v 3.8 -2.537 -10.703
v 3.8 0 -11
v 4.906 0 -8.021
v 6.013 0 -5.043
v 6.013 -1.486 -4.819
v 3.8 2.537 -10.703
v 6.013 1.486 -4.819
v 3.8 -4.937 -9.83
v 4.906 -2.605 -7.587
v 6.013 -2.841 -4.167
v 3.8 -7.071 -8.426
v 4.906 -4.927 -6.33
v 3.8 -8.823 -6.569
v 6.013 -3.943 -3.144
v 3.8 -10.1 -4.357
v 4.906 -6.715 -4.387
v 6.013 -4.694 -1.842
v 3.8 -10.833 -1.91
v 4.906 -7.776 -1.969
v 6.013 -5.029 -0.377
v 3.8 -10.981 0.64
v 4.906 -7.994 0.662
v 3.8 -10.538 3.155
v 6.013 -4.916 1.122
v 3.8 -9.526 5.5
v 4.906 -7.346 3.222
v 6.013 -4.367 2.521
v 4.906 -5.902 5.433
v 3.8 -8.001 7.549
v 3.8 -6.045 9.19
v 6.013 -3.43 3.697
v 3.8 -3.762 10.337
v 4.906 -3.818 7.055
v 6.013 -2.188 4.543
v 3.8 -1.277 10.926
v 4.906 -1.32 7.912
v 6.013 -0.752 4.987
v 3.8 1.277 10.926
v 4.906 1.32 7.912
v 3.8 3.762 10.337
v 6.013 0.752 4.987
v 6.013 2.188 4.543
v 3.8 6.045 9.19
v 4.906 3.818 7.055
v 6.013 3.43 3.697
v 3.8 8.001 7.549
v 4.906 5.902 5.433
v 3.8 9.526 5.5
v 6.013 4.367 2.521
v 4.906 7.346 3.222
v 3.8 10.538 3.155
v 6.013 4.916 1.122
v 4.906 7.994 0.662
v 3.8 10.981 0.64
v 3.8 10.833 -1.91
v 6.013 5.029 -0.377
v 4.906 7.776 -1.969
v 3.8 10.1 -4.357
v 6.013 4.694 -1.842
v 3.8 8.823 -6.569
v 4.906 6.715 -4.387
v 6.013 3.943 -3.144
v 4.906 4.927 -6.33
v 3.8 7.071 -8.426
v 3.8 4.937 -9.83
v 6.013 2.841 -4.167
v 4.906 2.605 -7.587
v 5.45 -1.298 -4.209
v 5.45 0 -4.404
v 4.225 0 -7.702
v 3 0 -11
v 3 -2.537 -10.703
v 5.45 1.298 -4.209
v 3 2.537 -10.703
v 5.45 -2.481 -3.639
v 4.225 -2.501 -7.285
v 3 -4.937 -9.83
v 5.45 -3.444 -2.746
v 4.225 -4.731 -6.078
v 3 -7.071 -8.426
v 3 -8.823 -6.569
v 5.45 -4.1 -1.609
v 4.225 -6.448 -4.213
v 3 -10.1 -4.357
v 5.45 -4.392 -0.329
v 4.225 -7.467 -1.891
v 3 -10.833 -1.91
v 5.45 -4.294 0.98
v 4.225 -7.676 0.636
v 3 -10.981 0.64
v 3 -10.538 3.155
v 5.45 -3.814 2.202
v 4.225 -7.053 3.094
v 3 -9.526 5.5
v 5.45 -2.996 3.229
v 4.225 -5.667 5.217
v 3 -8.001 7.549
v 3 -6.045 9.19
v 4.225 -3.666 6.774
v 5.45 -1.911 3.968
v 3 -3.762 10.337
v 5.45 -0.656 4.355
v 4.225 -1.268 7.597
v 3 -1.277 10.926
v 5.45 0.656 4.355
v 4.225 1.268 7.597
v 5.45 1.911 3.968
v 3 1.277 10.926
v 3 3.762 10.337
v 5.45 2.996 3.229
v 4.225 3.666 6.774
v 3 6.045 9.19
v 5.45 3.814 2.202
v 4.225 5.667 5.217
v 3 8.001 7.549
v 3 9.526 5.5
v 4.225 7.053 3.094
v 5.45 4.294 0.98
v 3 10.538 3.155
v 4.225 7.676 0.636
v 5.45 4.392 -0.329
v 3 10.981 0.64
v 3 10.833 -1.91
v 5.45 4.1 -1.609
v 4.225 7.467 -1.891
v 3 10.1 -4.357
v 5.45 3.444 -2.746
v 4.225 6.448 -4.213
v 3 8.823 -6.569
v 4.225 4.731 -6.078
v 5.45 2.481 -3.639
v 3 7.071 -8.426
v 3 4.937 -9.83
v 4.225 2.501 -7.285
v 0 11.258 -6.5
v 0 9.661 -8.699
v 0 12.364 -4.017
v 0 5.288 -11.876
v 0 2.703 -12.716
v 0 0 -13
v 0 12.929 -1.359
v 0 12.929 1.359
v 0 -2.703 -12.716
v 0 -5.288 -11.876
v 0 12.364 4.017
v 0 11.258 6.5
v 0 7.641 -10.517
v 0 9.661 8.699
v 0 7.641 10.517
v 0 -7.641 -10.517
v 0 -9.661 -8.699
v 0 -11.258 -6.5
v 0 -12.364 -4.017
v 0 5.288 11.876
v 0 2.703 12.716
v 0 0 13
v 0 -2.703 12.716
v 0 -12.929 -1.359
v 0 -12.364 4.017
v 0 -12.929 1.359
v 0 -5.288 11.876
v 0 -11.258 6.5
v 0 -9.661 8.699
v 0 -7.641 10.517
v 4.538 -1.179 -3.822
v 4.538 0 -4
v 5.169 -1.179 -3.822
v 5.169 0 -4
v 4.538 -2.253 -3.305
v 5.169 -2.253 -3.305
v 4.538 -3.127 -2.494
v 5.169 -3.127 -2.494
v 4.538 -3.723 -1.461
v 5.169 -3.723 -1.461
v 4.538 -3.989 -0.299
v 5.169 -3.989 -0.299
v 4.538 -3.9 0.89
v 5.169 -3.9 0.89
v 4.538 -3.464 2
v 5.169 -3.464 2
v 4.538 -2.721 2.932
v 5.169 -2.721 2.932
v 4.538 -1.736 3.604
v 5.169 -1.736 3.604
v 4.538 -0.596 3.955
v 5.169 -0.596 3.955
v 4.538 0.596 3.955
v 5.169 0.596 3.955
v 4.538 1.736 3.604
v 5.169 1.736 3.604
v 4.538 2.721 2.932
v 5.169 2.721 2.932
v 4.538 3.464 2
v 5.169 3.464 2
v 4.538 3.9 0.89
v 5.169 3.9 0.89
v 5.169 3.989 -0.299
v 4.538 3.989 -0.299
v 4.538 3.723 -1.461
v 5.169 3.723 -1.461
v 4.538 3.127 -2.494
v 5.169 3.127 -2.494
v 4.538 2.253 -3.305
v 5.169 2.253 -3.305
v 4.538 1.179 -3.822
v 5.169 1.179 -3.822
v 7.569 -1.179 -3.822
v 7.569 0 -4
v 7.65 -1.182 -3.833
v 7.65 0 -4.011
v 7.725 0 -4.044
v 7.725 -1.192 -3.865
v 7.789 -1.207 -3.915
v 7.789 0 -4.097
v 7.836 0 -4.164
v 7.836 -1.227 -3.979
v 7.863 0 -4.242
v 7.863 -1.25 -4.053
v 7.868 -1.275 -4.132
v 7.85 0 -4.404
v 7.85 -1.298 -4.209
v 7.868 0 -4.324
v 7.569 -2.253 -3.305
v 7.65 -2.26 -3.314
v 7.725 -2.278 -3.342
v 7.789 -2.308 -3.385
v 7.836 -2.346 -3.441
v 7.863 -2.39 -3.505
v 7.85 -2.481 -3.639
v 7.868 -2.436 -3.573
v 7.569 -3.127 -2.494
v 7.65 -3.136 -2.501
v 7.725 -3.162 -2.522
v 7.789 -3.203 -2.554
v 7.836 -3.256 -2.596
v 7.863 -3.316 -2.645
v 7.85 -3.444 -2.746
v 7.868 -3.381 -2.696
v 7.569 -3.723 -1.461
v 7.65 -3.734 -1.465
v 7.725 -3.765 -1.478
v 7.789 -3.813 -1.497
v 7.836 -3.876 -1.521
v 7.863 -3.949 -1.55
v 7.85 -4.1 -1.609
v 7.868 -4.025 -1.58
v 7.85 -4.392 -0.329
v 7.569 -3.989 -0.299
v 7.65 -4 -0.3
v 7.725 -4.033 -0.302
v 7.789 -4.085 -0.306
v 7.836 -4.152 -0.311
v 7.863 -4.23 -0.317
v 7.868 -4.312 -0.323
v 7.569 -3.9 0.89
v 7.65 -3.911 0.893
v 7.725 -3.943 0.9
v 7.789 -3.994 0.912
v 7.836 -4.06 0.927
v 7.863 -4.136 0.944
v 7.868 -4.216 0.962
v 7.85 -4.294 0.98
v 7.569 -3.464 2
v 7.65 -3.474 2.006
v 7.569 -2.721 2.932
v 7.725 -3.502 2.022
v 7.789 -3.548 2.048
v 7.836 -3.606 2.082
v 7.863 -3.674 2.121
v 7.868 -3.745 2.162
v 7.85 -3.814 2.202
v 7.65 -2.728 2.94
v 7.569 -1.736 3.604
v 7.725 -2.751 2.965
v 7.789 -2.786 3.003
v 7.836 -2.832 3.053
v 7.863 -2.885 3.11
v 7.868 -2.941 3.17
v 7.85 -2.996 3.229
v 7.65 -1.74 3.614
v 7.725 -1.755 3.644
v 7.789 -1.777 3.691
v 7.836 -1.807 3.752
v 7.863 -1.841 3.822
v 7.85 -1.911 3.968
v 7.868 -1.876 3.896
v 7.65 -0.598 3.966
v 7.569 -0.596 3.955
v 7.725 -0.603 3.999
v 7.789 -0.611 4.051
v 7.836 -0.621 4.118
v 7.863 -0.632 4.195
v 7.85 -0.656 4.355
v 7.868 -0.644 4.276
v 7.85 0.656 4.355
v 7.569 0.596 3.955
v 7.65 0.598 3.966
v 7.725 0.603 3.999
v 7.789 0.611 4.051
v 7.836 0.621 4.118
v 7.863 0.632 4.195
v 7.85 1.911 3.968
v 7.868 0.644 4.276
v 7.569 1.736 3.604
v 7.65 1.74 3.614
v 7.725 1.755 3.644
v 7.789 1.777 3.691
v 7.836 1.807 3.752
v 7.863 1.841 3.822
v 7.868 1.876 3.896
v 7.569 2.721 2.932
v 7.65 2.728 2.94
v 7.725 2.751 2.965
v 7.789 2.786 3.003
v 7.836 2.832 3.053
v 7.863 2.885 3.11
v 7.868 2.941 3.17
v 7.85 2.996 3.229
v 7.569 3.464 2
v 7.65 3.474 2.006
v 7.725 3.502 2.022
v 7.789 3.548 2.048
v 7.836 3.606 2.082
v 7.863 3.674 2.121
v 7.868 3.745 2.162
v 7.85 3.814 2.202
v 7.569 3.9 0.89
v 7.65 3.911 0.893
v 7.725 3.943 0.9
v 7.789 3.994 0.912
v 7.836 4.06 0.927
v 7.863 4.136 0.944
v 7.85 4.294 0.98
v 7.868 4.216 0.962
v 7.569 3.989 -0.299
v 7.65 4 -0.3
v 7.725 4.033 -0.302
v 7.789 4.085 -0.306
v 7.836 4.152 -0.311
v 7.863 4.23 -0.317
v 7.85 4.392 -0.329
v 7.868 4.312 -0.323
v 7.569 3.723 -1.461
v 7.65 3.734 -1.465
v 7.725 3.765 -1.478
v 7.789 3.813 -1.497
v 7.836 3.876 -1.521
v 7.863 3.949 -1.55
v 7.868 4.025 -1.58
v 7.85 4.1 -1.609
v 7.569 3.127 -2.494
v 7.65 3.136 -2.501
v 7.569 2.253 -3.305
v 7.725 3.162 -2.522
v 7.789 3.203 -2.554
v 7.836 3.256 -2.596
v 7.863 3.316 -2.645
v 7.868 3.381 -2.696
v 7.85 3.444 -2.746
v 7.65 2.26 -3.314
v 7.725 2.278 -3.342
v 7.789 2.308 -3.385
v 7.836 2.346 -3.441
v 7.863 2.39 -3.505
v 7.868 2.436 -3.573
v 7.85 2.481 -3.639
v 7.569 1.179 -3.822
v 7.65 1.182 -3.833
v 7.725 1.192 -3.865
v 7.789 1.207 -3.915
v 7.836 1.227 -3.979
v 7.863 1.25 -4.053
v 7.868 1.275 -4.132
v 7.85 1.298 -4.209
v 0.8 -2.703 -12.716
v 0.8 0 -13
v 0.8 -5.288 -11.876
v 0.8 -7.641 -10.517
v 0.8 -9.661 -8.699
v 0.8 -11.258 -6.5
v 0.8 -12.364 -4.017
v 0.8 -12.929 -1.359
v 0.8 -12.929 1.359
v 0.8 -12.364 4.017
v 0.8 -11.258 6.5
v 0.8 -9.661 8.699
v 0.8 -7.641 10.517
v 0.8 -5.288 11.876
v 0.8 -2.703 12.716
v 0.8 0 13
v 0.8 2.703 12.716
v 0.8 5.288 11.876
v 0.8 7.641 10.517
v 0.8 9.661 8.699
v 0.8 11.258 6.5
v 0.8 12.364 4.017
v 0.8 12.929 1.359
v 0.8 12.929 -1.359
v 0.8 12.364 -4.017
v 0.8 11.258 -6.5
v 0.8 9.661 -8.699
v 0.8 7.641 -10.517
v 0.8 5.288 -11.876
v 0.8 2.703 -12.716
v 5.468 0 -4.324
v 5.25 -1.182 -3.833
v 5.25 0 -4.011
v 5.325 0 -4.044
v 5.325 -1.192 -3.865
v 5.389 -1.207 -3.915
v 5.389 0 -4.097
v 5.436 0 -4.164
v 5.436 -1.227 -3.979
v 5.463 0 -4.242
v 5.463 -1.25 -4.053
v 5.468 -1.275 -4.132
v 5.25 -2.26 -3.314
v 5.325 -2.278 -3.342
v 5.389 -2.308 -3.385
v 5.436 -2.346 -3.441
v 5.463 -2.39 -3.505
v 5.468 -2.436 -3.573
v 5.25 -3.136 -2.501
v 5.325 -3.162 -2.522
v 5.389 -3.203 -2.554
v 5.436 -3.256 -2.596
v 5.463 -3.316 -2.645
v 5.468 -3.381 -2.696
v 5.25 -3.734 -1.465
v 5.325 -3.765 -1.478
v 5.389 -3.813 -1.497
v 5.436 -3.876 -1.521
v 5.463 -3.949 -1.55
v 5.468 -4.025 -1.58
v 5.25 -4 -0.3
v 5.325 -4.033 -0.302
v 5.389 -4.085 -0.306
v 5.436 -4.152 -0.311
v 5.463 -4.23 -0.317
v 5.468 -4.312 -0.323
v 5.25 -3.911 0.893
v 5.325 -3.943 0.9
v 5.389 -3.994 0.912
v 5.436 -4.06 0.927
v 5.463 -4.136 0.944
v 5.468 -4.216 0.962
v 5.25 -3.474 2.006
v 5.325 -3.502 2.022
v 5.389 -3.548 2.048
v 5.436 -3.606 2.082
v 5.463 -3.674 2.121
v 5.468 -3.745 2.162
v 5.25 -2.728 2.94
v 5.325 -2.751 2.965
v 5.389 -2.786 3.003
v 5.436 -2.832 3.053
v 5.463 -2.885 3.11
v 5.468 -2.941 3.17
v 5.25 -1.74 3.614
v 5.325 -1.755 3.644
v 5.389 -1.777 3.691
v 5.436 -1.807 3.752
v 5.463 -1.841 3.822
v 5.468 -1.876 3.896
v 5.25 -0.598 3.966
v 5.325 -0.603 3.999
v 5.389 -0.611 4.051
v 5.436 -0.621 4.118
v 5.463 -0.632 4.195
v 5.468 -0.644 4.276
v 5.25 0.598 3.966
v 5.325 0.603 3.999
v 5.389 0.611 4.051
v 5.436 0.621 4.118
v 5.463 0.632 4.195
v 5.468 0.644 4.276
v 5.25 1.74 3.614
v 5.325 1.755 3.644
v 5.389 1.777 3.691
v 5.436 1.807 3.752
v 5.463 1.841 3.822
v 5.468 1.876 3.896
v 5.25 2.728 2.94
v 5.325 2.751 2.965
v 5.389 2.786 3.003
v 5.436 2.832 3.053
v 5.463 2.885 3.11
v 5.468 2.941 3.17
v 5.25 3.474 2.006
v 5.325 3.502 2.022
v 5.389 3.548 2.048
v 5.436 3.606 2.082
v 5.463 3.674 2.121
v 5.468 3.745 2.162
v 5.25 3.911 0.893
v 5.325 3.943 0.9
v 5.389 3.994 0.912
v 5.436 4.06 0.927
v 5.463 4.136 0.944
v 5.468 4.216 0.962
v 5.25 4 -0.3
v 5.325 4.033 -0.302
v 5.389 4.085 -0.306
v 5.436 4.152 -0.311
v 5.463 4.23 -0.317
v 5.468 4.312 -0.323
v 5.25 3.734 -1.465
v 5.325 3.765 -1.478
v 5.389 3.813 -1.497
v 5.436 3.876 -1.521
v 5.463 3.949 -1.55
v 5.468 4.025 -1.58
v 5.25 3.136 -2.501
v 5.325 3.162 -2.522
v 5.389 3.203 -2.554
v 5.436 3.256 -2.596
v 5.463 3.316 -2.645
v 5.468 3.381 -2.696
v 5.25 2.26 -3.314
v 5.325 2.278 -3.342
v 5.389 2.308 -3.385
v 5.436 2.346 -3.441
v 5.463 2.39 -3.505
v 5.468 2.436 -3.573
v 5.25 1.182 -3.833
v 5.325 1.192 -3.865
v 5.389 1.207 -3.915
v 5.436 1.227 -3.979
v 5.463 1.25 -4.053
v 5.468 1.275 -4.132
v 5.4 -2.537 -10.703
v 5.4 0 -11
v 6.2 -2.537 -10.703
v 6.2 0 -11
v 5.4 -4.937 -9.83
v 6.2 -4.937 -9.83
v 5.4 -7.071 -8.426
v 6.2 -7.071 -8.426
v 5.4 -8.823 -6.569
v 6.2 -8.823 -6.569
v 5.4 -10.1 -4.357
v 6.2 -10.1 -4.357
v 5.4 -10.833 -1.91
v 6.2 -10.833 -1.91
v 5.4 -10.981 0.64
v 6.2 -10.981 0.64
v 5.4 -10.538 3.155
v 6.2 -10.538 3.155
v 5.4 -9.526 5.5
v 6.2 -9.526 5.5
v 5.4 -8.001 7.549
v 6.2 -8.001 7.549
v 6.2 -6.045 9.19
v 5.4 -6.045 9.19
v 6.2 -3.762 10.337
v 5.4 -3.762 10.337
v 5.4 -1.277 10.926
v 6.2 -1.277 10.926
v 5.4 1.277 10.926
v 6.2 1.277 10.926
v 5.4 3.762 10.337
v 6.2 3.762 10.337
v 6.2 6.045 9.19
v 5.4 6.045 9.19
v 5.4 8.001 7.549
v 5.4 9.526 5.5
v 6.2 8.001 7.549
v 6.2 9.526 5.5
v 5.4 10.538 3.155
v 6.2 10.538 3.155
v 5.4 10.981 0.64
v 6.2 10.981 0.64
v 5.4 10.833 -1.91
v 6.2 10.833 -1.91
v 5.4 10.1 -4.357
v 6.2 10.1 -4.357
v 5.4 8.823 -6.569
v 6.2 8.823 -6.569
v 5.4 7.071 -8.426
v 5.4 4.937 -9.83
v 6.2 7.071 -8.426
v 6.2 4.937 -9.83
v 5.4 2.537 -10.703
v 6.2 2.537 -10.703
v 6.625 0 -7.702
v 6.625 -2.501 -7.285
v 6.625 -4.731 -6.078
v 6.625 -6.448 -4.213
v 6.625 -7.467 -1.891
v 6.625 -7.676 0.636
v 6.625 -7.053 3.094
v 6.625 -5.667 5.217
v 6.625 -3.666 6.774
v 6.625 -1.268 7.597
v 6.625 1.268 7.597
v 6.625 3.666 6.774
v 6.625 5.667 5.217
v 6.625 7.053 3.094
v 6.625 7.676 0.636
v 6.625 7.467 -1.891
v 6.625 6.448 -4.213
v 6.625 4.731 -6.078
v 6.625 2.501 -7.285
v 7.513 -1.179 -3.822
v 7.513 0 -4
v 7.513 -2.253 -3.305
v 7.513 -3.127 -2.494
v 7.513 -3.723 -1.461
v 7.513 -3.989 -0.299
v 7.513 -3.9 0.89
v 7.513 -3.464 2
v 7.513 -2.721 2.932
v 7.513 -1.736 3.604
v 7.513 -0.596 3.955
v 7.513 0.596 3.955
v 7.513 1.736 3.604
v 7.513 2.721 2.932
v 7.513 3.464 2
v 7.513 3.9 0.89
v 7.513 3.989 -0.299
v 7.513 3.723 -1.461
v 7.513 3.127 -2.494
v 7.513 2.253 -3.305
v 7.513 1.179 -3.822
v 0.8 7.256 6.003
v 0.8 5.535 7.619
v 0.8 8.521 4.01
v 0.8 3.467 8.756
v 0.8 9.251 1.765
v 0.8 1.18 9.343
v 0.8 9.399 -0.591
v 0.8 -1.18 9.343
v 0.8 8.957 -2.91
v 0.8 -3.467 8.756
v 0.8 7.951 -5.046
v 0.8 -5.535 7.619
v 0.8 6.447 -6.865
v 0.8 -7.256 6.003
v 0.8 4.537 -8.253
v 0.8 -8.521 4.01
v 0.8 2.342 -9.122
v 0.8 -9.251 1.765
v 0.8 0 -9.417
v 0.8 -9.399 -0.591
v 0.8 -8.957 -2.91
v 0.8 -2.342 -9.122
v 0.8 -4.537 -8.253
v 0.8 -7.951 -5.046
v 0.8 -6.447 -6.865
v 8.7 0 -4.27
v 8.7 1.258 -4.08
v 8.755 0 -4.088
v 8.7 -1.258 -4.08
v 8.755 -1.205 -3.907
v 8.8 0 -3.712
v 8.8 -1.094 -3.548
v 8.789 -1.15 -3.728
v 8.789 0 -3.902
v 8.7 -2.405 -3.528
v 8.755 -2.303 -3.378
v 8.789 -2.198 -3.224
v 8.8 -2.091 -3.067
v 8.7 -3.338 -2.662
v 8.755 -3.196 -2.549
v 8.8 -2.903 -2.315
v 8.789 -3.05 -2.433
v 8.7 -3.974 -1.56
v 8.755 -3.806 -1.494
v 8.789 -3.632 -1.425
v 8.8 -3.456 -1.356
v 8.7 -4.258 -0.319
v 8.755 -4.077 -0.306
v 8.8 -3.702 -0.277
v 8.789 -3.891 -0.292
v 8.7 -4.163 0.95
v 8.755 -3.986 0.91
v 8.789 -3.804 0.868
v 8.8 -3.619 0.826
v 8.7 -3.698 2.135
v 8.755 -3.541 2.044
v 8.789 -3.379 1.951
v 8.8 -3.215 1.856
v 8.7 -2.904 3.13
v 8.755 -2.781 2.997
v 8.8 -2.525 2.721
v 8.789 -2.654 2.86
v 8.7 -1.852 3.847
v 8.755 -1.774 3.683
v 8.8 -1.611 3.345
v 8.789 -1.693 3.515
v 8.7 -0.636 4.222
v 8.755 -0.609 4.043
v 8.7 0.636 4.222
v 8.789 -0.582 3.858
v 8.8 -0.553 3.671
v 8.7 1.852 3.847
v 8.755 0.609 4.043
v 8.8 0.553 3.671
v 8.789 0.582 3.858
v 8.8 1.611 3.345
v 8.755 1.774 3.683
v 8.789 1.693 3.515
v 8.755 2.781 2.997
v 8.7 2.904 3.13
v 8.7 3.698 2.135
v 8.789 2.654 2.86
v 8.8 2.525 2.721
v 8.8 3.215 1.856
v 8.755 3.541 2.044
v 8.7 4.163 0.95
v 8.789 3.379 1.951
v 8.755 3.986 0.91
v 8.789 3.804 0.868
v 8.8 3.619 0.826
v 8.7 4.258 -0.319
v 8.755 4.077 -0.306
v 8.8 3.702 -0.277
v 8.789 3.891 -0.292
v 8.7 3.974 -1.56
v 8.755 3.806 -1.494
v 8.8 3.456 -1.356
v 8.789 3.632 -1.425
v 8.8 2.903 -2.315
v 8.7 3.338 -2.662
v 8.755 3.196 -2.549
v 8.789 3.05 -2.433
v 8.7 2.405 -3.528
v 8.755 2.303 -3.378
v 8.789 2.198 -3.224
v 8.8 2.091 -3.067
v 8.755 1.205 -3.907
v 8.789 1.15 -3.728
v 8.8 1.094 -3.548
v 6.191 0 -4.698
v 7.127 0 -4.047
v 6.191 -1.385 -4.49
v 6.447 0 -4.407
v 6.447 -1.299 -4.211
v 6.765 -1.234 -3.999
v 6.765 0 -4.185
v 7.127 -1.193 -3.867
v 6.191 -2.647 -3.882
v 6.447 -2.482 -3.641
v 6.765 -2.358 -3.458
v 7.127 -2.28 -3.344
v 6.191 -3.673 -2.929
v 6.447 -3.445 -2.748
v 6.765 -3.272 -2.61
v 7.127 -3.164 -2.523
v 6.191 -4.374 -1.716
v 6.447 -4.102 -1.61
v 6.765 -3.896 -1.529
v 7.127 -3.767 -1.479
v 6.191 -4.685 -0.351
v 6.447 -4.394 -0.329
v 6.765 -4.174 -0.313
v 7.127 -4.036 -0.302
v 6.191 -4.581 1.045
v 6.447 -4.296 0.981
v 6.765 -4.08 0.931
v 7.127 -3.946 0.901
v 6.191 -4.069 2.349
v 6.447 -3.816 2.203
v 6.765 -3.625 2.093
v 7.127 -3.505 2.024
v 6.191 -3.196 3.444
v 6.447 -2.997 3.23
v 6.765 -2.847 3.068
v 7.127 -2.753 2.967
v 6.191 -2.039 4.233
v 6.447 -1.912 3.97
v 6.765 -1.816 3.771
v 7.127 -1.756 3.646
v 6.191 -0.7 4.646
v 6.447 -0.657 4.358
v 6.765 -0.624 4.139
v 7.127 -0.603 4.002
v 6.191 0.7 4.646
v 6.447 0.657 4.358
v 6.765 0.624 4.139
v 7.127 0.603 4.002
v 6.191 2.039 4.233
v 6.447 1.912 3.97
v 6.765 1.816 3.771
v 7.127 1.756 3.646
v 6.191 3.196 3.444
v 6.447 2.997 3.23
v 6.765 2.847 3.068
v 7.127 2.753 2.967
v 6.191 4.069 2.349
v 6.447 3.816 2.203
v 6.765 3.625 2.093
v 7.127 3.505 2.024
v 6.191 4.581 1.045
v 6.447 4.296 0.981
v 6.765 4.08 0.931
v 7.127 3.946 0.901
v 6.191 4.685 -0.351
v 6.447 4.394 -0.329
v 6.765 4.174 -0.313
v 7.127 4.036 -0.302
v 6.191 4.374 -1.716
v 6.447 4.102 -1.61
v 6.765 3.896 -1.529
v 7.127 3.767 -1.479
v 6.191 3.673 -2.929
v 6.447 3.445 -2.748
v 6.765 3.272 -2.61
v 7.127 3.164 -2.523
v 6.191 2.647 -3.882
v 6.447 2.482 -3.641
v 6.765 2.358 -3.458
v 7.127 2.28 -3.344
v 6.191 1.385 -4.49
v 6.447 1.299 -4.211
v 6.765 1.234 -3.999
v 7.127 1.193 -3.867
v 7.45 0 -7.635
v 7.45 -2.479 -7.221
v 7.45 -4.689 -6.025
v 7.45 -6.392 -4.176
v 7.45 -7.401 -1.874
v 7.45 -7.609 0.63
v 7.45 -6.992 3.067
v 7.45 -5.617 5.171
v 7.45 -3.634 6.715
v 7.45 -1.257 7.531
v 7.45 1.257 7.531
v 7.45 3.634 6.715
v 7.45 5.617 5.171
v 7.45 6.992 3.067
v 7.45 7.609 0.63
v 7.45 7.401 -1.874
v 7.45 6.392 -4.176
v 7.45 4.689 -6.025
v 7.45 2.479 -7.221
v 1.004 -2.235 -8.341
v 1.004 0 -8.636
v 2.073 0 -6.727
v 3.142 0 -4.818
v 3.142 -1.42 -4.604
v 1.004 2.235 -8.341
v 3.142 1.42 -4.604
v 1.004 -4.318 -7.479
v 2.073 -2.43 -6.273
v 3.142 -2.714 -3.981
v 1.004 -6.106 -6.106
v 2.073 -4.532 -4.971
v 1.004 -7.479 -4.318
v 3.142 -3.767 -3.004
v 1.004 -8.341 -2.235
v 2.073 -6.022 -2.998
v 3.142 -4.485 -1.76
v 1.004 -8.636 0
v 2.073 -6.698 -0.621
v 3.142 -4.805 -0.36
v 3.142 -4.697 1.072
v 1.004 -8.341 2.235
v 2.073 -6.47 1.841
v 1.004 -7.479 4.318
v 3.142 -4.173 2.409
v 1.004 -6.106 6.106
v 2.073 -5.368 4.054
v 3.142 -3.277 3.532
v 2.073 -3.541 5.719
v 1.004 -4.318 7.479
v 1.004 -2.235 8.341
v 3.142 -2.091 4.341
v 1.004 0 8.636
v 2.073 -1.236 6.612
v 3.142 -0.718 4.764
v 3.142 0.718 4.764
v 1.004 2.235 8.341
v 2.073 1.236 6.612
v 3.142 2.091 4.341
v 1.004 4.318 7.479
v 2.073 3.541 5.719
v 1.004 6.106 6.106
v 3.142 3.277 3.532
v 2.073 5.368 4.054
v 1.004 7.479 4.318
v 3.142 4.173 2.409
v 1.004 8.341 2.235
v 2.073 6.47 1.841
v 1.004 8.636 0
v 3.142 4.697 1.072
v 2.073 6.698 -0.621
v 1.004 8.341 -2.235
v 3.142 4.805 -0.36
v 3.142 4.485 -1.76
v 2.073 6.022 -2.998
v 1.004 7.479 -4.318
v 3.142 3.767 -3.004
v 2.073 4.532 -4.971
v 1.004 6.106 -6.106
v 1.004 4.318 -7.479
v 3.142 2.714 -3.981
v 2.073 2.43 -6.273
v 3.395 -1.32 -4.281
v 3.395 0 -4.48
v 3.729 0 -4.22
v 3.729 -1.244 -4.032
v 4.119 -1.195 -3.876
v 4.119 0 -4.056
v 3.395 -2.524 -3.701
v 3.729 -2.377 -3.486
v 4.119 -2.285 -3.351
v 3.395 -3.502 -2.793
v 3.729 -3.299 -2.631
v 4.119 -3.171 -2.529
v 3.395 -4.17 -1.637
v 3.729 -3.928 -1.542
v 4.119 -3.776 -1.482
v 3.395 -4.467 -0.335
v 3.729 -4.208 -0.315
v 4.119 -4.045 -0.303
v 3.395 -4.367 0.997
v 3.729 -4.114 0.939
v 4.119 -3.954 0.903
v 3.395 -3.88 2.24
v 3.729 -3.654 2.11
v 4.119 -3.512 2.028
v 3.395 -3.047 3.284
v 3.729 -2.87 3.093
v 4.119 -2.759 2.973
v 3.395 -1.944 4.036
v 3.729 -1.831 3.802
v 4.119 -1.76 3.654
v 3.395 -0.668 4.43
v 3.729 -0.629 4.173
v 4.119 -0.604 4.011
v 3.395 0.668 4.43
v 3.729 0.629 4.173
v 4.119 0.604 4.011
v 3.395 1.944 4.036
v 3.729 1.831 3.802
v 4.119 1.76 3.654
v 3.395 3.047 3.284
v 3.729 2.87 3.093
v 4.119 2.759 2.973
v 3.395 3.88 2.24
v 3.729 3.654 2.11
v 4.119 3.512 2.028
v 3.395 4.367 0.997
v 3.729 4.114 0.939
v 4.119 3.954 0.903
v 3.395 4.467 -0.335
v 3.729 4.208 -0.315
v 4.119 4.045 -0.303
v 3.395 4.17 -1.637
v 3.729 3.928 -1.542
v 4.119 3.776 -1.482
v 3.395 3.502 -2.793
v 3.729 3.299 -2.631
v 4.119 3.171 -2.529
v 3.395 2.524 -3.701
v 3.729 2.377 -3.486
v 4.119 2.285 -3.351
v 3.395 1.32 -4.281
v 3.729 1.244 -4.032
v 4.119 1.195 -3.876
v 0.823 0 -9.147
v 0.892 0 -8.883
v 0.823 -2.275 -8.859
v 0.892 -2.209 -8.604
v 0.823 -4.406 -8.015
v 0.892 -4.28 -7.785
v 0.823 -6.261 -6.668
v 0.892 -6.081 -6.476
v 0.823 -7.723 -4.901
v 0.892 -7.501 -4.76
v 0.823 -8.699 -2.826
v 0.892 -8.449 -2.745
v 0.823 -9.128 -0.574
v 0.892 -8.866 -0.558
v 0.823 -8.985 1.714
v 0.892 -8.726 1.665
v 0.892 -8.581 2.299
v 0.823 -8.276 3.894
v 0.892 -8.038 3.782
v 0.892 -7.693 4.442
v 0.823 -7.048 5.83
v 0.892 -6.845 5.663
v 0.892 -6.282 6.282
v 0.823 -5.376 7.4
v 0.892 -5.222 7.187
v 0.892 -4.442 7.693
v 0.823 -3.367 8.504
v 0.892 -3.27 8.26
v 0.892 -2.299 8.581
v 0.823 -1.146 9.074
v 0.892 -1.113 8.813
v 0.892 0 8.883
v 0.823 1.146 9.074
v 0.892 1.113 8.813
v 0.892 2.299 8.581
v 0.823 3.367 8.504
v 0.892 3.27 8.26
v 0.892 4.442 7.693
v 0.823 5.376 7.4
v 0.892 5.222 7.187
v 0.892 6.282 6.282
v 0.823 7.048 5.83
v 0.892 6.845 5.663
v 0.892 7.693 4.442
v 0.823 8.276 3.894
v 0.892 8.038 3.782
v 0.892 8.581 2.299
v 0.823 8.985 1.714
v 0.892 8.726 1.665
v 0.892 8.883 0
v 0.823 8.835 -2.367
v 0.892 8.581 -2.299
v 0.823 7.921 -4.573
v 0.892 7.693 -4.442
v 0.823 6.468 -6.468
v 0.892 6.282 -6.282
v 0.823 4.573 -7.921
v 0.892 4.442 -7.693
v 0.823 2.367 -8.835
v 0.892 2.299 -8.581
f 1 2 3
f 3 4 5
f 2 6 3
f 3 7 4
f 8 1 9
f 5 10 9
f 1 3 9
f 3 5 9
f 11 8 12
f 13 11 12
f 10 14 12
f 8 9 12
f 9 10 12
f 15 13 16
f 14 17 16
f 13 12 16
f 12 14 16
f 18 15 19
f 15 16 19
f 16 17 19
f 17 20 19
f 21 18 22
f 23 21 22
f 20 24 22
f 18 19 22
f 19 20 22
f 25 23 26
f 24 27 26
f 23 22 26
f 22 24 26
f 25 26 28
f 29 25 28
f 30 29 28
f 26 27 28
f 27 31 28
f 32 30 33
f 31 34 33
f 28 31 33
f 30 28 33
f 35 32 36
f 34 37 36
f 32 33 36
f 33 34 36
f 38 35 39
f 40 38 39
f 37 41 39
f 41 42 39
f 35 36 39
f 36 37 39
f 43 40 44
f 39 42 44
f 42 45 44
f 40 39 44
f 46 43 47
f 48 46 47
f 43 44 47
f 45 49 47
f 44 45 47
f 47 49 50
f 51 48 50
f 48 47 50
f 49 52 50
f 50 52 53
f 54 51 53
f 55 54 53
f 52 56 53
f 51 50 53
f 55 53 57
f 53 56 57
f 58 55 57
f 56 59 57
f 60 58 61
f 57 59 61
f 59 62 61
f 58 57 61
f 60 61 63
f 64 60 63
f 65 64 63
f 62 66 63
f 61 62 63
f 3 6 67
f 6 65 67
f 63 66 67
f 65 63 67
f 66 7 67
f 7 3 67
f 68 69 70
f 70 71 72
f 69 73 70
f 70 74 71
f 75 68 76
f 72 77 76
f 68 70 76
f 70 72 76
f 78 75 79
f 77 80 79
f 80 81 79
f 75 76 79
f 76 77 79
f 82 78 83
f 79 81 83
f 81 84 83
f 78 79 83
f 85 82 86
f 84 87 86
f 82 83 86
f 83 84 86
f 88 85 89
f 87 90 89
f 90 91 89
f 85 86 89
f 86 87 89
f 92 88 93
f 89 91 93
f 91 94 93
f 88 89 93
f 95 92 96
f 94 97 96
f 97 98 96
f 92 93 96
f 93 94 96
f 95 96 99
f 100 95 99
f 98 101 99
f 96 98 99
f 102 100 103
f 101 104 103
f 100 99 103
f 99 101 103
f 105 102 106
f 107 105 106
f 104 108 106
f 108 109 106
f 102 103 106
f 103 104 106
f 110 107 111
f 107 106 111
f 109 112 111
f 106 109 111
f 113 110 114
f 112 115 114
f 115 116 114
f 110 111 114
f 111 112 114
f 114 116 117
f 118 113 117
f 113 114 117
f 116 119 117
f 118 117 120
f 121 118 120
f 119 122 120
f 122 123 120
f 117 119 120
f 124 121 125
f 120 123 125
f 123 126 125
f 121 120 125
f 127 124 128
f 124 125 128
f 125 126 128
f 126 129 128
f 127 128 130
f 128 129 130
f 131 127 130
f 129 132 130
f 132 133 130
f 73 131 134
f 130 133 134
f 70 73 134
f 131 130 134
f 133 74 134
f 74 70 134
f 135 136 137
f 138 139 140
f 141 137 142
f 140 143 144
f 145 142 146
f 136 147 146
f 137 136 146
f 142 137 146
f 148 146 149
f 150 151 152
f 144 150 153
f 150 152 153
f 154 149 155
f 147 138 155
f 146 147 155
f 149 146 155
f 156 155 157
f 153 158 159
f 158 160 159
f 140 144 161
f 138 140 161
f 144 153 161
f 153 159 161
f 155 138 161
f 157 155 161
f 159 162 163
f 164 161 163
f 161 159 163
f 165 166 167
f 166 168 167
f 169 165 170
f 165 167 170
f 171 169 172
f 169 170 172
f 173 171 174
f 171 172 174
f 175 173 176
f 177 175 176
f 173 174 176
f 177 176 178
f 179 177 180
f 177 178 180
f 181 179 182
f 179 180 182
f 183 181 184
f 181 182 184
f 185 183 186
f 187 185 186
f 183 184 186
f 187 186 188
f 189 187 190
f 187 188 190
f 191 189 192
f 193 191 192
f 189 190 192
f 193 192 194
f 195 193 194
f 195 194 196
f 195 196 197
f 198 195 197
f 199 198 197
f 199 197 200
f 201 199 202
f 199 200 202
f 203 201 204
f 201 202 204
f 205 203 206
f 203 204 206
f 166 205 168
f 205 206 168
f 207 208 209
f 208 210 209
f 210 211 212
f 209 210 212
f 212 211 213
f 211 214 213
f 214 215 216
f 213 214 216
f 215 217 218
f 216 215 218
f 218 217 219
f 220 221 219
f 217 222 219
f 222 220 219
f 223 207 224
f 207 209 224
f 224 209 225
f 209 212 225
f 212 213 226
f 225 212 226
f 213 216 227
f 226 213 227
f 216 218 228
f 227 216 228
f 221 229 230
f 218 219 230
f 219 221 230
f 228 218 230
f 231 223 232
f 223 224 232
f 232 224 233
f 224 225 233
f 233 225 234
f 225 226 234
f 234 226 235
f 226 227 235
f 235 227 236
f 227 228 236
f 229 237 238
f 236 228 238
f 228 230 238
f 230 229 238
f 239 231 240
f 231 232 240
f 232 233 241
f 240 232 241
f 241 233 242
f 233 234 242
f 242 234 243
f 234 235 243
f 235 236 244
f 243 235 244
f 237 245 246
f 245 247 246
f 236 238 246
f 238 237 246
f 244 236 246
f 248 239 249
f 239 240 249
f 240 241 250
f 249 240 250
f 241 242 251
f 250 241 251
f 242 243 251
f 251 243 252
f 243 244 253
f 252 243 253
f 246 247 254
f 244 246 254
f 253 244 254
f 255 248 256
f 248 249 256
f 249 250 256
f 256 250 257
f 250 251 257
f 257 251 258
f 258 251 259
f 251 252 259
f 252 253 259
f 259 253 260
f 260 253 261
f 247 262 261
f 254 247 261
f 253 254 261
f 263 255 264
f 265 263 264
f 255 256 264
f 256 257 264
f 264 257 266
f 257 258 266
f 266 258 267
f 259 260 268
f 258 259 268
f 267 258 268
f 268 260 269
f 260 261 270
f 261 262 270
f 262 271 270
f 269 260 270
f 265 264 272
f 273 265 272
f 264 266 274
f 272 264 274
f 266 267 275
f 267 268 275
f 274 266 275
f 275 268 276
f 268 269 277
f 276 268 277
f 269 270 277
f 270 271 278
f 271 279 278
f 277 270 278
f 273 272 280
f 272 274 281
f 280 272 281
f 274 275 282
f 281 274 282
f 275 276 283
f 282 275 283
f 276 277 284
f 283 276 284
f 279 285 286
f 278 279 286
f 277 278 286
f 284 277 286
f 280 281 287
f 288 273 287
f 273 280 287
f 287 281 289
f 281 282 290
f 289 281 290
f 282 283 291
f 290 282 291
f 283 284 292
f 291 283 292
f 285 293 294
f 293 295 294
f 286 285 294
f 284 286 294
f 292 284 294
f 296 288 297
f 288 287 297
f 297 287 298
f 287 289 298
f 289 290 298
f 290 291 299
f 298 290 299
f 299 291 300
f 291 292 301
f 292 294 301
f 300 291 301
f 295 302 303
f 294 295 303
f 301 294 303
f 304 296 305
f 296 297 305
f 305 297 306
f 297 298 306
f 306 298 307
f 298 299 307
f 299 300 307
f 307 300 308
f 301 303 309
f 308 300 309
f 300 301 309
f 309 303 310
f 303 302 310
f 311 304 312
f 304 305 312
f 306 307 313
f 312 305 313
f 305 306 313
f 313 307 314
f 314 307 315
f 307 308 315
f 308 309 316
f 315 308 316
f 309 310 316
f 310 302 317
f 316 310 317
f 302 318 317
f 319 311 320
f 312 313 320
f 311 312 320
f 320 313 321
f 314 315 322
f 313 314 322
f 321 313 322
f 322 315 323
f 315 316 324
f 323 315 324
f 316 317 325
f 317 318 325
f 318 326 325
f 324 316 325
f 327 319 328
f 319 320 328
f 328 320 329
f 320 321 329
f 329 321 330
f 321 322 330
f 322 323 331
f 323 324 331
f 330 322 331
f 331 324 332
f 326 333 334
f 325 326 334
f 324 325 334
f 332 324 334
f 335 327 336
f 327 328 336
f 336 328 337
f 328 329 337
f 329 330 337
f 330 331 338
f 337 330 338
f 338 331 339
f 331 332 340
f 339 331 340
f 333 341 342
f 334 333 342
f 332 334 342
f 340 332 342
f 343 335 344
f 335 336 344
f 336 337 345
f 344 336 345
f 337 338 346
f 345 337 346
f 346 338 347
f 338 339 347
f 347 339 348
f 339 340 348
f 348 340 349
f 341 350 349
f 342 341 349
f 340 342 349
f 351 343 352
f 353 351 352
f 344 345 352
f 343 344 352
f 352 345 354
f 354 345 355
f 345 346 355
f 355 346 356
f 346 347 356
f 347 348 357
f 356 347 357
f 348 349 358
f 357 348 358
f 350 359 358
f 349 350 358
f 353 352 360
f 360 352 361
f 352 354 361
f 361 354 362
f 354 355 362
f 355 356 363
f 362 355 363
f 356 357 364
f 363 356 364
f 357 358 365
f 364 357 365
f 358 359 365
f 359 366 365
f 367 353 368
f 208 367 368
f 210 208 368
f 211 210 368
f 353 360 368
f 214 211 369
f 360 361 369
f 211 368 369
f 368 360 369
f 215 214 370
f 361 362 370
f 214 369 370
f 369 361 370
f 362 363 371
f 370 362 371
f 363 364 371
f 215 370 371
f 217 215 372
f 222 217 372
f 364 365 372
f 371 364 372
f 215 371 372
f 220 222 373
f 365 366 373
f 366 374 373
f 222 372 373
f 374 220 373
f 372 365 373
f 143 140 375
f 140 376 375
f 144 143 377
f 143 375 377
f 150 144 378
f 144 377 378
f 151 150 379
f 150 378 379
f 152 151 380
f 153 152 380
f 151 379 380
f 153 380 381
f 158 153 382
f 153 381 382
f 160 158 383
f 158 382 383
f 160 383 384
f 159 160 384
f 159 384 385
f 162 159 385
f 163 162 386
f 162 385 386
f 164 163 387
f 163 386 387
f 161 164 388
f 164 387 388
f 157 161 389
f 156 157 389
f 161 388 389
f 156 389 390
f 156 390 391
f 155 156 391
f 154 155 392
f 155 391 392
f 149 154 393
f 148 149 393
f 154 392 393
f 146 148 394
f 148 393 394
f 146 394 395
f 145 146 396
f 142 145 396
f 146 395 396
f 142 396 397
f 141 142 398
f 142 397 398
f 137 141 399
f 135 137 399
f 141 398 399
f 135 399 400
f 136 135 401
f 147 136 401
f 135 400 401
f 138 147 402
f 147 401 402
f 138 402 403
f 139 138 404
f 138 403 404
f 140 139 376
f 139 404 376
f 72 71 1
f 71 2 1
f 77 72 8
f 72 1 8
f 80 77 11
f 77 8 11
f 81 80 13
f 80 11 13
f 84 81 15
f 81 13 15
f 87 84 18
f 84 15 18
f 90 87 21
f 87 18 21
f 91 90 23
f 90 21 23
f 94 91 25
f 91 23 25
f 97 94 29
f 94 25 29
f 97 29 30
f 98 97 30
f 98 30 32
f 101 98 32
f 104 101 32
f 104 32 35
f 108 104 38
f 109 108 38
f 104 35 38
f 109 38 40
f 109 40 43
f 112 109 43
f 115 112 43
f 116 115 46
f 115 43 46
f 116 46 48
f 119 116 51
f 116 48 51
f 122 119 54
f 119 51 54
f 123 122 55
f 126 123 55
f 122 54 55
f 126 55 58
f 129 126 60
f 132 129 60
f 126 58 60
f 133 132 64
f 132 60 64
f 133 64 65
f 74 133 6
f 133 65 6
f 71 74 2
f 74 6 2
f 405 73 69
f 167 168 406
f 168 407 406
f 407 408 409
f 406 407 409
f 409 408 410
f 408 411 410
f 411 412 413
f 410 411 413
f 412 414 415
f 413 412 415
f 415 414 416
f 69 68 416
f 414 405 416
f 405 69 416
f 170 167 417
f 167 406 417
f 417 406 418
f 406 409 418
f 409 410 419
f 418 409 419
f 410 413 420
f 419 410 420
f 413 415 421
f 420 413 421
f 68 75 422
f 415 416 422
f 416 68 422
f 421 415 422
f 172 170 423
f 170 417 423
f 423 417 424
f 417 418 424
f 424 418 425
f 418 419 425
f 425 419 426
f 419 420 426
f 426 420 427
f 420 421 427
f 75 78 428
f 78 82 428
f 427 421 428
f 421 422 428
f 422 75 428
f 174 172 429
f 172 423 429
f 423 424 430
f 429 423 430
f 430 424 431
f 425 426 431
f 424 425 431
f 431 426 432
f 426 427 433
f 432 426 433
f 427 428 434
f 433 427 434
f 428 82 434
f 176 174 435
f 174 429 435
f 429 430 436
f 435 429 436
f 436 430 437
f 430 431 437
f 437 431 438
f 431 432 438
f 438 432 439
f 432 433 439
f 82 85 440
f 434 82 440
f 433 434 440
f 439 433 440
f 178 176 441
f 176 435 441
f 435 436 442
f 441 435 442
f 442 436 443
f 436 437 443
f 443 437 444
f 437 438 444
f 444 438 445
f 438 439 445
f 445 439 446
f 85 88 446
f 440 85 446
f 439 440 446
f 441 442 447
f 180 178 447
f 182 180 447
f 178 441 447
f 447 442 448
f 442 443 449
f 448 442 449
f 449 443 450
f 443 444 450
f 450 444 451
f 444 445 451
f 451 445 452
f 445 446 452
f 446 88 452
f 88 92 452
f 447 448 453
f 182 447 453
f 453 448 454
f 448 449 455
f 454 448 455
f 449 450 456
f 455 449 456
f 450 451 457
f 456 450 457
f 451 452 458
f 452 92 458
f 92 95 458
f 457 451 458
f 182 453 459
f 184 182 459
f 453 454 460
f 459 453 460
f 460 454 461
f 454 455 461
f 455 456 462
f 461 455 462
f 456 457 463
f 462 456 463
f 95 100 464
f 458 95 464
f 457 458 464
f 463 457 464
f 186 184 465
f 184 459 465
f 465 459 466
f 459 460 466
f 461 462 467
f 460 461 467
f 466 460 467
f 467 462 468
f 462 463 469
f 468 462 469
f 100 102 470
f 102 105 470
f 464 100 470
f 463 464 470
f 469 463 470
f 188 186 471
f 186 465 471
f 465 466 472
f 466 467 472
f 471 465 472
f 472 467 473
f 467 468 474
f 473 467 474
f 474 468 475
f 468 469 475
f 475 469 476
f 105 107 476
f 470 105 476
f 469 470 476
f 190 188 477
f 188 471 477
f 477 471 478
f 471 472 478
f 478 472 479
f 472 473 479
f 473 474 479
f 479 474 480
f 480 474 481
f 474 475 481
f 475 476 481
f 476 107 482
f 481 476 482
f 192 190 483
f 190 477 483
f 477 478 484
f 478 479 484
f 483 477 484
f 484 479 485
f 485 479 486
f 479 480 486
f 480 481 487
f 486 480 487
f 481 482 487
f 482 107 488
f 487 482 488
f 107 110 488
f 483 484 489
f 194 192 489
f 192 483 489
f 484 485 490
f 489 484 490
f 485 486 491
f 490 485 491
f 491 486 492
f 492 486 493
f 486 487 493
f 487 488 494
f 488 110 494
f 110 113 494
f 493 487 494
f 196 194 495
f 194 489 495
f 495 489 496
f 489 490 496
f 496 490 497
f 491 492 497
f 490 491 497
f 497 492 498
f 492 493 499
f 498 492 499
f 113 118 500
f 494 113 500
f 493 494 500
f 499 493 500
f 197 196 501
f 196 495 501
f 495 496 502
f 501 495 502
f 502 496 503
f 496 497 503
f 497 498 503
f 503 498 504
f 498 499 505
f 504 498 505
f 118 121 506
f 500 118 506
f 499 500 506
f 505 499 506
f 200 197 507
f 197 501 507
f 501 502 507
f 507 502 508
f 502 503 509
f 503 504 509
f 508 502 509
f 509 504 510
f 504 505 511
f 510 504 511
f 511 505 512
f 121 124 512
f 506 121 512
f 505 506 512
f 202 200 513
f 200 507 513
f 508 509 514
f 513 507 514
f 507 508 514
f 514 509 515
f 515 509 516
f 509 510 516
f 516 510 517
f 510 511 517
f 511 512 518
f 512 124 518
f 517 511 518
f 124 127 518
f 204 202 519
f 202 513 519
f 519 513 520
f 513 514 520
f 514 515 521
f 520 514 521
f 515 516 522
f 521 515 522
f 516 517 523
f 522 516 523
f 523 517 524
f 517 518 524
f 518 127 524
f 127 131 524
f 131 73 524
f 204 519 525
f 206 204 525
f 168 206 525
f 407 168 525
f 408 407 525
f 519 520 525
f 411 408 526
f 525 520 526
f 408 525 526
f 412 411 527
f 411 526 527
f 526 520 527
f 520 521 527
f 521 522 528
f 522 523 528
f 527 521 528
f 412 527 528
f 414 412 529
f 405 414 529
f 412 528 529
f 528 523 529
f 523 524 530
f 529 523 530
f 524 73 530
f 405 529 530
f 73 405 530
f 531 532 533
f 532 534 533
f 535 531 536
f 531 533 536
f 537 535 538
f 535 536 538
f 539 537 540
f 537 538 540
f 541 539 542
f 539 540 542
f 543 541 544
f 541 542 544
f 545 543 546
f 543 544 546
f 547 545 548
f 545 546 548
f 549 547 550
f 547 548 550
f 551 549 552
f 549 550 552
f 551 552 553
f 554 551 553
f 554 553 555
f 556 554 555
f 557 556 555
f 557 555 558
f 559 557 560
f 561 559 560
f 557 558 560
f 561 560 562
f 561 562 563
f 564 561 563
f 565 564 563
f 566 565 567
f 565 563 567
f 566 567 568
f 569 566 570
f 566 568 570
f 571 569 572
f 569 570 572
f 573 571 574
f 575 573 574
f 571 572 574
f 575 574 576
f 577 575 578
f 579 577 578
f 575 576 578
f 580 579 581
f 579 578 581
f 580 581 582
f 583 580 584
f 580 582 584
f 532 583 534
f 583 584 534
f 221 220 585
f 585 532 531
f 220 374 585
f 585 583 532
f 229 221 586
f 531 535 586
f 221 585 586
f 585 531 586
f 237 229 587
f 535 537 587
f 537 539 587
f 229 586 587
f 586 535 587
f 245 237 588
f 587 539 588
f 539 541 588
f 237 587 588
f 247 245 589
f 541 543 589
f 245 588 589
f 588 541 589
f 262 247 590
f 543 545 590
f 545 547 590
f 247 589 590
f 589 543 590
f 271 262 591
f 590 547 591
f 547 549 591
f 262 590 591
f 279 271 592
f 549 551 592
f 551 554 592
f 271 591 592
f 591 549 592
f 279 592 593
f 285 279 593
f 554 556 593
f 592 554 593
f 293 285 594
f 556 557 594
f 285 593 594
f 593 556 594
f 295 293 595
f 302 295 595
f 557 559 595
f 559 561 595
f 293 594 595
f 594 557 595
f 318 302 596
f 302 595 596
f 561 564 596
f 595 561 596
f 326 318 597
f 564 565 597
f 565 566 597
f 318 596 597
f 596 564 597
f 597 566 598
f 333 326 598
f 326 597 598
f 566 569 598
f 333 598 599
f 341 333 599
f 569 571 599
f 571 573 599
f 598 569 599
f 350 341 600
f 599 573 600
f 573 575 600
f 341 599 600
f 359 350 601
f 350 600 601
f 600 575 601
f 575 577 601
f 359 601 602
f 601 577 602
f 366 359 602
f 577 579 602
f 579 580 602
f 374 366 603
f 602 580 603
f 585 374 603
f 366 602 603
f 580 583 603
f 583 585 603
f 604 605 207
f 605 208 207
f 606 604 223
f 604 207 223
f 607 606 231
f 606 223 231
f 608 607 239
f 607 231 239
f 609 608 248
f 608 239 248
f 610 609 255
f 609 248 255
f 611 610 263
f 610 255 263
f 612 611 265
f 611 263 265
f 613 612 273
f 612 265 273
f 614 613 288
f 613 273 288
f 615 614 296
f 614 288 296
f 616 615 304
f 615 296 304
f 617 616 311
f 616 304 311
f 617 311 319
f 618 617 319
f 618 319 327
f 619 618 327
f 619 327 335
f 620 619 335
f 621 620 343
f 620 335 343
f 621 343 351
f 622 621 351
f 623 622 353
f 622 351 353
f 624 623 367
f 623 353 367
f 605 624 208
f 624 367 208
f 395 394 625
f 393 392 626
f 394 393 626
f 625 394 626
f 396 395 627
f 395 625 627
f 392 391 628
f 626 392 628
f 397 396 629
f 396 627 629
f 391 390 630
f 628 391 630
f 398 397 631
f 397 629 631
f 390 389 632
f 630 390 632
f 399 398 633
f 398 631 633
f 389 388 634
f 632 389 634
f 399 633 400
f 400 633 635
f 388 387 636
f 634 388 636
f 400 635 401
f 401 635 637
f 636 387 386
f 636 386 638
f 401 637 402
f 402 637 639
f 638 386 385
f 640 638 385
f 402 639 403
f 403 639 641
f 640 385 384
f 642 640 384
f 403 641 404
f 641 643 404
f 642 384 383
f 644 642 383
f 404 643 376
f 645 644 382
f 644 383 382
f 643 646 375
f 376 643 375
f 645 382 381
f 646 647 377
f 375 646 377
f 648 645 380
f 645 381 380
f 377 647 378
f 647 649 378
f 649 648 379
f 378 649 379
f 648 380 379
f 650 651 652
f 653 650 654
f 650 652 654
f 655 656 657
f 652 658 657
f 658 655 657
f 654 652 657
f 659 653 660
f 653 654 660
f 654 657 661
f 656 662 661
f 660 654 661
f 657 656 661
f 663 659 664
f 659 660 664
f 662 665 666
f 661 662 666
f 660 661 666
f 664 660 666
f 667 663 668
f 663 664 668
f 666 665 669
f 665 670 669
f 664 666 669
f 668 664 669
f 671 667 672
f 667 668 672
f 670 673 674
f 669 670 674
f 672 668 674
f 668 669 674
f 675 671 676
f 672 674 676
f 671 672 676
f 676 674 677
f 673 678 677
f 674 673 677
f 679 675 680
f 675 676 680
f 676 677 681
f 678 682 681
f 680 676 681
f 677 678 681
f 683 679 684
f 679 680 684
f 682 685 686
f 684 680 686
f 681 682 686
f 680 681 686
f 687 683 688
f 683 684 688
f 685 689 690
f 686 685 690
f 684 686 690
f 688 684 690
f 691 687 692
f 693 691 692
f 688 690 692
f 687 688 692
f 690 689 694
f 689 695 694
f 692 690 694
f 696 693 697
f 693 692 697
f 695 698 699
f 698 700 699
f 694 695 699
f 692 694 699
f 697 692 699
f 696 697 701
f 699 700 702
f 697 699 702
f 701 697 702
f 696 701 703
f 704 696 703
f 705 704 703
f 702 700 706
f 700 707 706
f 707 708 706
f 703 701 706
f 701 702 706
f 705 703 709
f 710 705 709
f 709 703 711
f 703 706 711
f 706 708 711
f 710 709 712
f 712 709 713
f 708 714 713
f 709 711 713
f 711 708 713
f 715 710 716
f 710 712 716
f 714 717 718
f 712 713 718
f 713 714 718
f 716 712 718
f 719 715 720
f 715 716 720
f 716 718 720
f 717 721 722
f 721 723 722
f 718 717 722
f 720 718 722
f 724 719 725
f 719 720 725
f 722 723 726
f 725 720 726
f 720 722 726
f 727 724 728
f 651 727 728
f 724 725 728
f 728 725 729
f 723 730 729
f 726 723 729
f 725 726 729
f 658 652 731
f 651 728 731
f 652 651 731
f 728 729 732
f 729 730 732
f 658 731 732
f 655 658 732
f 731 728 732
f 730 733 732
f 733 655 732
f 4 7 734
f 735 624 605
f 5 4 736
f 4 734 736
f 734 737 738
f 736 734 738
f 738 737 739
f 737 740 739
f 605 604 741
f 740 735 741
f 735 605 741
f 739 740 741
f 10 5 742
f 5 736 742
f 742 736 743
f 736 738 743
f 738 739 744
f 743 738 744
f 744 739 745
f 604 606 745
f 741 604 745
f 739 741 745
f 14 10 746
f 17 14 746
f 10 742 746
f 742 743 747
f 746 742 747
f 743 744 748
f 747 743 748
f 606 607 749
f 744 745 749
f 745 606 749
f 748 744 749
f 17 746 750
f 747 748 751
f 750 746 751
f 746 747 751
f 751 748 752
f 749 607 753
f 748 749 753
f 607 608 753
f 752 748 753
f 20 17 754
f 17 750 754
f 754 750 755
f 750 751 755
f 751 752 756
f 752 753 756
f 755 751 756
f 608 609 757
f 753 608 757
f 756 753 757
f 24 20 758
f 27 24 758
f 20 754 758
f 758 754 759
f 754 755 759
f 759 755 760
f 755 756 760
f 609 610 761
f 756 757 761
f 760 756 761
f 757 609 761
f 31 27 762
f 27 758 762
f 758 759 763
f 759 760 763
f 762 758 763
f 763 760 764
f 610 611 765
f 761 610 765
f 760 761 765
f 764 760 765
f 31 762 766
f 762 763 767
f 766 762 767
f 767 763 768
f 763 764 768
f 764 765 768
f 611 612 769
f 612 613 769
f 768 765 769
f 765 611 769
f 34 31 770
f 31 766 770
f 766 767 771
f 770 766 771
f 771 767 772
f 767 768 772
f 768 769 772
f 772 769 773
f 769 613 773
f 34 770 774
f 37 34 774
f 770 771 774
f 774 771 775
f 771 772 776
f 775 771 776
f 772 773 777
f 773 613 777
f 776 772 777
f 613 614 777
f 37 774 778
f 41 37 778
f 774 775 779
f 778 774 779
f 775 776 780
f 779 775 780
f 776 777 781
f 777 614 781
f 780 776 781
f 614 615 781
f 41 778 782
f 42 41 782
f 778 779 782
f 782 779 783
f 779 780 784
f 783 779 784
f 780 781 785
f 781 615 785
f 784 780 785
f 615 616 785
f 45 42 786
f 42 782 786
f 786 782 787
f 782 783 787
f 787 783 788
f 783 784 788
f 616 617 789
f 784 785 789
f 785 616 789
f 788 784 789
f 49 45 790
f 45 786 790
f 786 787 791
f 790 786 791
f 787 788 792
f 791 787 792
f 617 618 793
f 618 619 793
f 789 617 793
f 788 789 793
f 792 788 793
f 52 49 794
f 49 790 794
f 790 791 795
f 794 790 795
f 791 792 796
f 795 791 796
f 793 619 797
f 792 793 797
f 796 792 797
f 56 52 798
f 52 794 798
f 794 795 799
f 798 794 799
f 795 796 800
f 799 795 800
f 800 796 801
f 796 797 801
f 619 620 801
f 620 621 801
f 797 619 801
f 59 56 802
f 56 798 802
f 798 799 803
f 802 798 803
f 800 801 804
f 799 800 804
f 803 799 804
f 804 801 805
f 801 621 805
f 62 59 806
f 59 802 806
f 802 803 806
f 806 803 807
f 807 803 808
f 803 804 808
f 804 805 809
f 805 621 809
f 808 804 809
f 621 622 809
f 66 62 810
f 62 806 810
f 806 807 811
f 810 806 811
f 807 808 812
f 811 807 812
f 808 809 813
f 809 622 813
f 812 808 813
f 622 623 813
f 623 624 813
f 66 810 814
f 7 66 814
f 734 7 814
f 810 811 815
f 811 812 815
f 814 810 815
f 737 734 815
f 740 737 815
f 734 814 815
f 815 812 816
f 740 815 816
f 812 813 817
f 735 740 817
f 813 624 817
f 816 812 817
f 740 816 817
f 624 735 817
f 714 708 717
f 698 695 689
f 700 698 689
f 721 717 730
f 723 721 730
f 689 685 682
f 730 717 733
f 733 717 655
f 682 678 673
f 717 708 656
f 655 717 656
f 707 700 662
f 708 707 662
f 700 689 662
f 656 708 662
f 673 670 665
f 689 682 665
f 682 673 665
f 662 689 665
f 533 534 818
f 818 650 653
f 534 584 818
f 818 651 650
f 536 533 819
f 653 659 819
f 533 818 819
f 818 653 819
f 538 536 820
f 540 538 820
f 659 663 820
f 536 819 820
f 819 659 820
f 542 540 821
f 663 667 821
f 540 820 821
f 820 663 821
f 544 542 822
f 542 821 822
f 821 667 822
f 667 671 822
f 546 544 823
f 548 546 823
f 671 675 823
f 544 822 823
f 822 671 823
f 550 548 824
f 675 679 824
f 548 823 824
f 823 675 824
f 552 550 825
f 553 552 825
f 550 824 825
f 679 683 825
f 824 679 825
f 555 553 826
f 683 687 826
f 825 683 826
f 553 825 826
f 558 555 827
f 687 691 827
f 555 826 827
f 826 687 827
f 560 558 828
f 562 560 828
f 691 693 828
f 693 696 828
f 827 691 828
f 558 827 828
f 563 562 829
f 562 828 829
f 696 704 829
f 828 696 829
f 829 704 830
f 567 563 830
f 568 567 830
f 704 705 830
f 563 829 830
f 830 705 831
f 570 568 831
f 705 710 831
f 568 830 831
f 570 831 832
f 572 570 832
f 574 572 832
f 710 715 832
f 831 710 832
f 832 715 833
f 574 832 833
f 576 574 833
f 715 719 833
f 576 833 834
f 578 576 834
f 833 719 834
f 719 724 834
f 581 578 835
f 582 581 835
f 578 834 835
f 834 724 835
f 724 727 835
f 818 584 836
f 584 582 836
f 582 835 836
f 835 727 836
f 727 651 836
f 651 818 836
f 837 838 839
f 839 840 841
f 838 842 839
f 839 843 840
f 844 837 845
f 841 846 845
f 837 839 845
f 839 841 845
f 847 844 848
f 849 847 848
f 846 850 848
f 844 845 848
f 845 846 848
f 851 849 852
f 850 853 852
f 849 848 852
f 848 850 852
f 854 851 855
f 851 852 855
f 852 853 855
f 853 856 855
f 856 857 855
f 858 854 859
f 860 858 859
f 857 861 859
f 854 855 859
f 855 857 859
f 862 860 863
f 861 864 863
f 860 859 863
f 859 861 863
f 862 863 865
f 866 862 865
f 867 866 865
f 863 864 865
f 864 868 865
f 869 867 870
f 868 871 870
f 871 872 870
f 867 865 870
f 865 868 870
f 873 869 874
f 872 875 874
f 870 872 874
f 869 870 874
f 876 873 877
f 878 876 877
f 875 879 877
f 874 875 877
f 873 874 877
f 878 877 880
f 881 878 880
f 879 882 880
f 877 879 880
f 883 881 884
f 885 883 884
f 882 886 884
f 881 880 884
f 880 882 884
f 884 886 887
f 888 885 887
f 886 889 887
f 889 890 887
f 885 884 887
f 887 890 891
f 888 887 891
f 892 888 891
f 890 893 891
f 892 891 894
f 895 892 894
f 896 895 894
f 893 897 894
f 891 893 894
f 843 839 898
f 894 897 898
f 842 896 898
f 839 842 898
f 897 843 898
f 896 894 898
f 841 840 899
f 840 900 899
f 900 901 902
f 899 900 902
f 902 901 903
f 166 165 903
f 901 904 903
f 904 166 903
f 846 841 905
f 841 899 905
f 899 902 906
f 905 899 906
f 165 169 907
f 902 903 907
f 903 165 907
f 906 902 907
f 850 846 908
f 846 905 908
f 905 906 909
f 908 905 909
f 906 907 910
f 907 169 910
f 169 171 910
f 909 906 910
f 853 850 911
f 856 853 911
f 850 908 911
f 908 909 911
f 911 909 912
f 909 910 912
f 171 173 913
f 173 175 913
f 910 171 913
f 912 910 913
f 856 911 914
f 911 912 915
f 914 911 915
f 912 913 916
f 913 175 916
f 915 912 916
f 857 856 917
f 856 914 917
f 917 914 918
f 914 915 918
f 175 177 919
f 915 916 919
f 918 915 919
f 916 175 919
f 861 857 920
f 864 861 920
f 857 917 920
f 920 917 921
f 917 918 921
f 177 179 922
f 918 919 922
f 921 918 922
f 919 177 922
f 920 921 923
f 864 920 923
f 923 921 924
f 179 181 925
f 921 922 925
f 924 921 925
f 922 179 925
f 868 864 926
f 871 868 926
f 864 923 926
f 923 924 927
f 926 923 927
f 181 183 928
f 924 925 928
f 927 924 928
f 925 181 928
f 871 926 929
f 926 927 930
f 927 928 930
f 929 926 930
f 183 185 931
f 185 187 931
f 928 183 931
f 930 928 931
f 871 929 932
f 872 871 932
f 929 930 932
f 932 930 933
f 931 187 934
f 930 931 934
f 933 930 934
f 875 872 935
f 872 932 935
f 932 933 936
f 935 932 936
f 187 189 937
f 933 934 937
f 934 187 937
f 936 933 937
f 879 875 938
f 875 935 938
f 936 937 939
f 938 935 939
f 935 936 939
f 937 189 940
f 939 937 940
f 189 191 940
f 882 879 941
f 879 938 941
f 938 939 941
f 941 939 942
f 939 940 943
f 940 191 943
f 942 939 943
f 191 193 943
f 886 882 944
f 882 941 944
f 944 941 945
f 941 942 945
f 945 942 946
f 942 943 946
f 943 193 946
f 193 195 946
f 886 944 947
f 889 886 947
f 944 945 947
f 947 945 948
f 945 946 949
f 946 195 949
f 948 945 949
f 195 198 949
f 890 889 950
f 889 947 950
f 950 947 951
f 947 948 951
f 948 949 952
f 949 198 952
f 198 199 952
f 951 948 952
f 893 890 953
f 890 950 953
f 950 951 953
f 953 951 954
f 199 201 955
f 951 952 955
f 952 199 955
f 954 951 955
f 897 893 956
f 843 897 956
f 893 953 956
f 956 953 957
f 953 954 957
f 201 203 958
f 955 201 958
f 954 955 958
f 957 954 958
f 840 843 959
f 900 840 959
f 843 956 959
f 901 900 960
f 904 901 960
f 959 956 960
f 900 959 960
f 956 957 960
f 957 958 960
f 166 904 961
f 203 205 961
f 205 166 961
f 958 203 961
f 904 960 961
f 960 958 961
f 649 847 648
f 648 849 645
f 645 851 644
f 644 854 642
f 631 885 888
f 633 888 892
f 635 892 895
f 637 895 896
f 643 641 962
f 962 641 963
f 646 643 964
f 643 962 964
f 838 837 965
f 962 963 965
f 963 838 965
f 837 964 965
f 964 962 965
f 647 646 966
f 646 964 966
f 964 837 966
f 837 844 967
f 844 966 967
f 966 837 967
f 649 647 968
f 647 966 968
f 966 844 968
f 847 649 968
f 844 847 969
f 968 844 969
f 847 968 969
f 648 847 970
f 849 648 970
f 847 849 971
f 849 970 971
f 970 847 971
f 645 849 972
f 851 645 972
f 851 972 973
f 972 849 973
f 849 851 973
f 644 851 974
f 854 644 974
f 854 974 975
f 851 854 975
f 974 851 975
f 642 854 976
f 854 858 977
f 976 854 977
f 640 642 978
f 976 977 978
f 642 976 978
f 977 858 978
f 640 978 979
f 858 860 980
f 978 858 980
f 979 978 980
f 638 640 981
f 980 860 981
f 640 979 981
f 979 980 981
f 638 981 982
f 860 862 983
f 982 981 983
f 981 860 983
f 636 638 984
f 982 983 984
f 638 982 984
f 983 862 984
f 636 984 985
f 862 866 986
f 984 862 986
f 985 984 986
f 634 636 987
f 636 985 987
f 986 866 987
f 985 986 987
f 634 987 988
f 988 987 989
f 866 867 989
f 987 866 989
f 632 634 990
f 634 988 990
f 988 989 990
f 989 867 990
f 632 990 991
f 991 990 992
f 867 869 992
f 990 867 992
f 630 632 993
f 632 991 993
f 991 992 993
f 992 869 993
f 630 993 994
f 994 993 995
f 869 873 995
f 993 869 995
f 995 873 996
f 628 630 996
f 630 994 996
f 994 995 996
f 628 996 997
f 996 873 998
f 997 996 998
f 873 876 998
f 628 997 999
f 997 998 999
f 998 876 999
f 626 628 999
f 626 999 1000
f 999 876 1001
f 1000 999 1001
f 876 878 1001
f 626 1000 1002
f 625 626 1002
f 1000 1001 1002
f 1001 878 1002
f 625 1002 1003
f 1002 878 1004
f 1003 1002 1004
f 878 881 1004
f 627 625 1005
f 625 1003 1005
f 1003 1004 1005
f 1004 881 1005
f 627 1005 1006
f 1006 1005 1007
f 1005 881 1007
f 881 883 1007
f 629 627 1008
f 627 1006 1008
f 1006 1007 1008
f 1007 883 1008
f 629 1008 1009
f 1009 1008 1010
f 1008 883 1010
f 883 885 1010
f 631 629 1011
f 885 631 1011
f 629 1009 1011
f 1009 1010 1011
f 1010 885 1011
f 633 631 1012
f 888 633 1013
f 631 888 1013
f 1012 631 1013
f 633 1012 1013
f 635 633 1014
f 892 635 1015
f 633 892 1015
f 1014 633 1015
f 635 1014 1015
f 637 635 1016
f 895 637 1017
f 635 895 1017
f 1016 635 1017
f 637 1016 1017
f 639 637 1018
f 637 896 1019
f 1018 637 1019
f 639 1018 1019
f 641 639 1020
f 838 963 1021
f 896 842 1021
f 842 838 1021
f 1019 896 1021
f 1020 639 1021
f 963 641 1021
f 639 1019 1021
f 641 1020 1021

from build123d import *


with BuildPart() as part:
    # Sketch2 → Revolve1 (revolve)
    with BuildSketch(Plane(origin=(0, 0, 0), x_dir=(1, 0, 0), z_dir=(0, 1, 0))):
        with BuildLine():
            Line((0, 0), (0, 13))
            Line((0, 13), (0.8, 13))
            Line((0.8, 13), (0.8, 9.417496864))
            ThreePointArc((0.8, 9.417496864), (0.851837315, 9.013526198), (1.003990374, 8.635731474))
            Line((1.003990374, 8.635731474), (3.141788619, 4.81823461))
            ThreePointArc((3.141788619, 4.81823461), (3.728732309, 4.219633269), (4.537798244, 4))
            Line((4.537798244, 4), (5.168545919, 4))
            ThreePointArc((5.168545919, 4), (5.414855468, 4.128735275), (5.449773501, 4.404455959))
            Line((5.449773501, 4.404455959), (3, 11))
            Line((3, 11), (3.8, 11))
            Line((3.8, 11), (6.012636566, 5.042901553))
            ThreePointArc((6.012636566, 5.042901553), (6.599105133, 4.286349073), (7.512517001, 4))
            Line((7.512517001, 4), (7.568545919, 4))
            ThreePointArc((7.568545919, 4), (7.814855468, 4.128735275), (7.849773501, 4.404455959))
            Line((7.849773501, 4.404455959), (5.4, 11))
            Line((5.4, 11), (6.2, 11))
            Line((6.2, 11), (8.699880435, 4.269552674))
            ThreePointArc((8.699880435, 4.269552674), (8.774771205, 3.995465979), (8.8, 3.712454227))
            Line((8.8, 3.712454227), (8.8, 0))
            Line((8.8, 0), (0, 0))
        make_face()
    revolve(axis=Axis((8.8, 0, 0), (-1, 0, 0)))


solid = part.part
